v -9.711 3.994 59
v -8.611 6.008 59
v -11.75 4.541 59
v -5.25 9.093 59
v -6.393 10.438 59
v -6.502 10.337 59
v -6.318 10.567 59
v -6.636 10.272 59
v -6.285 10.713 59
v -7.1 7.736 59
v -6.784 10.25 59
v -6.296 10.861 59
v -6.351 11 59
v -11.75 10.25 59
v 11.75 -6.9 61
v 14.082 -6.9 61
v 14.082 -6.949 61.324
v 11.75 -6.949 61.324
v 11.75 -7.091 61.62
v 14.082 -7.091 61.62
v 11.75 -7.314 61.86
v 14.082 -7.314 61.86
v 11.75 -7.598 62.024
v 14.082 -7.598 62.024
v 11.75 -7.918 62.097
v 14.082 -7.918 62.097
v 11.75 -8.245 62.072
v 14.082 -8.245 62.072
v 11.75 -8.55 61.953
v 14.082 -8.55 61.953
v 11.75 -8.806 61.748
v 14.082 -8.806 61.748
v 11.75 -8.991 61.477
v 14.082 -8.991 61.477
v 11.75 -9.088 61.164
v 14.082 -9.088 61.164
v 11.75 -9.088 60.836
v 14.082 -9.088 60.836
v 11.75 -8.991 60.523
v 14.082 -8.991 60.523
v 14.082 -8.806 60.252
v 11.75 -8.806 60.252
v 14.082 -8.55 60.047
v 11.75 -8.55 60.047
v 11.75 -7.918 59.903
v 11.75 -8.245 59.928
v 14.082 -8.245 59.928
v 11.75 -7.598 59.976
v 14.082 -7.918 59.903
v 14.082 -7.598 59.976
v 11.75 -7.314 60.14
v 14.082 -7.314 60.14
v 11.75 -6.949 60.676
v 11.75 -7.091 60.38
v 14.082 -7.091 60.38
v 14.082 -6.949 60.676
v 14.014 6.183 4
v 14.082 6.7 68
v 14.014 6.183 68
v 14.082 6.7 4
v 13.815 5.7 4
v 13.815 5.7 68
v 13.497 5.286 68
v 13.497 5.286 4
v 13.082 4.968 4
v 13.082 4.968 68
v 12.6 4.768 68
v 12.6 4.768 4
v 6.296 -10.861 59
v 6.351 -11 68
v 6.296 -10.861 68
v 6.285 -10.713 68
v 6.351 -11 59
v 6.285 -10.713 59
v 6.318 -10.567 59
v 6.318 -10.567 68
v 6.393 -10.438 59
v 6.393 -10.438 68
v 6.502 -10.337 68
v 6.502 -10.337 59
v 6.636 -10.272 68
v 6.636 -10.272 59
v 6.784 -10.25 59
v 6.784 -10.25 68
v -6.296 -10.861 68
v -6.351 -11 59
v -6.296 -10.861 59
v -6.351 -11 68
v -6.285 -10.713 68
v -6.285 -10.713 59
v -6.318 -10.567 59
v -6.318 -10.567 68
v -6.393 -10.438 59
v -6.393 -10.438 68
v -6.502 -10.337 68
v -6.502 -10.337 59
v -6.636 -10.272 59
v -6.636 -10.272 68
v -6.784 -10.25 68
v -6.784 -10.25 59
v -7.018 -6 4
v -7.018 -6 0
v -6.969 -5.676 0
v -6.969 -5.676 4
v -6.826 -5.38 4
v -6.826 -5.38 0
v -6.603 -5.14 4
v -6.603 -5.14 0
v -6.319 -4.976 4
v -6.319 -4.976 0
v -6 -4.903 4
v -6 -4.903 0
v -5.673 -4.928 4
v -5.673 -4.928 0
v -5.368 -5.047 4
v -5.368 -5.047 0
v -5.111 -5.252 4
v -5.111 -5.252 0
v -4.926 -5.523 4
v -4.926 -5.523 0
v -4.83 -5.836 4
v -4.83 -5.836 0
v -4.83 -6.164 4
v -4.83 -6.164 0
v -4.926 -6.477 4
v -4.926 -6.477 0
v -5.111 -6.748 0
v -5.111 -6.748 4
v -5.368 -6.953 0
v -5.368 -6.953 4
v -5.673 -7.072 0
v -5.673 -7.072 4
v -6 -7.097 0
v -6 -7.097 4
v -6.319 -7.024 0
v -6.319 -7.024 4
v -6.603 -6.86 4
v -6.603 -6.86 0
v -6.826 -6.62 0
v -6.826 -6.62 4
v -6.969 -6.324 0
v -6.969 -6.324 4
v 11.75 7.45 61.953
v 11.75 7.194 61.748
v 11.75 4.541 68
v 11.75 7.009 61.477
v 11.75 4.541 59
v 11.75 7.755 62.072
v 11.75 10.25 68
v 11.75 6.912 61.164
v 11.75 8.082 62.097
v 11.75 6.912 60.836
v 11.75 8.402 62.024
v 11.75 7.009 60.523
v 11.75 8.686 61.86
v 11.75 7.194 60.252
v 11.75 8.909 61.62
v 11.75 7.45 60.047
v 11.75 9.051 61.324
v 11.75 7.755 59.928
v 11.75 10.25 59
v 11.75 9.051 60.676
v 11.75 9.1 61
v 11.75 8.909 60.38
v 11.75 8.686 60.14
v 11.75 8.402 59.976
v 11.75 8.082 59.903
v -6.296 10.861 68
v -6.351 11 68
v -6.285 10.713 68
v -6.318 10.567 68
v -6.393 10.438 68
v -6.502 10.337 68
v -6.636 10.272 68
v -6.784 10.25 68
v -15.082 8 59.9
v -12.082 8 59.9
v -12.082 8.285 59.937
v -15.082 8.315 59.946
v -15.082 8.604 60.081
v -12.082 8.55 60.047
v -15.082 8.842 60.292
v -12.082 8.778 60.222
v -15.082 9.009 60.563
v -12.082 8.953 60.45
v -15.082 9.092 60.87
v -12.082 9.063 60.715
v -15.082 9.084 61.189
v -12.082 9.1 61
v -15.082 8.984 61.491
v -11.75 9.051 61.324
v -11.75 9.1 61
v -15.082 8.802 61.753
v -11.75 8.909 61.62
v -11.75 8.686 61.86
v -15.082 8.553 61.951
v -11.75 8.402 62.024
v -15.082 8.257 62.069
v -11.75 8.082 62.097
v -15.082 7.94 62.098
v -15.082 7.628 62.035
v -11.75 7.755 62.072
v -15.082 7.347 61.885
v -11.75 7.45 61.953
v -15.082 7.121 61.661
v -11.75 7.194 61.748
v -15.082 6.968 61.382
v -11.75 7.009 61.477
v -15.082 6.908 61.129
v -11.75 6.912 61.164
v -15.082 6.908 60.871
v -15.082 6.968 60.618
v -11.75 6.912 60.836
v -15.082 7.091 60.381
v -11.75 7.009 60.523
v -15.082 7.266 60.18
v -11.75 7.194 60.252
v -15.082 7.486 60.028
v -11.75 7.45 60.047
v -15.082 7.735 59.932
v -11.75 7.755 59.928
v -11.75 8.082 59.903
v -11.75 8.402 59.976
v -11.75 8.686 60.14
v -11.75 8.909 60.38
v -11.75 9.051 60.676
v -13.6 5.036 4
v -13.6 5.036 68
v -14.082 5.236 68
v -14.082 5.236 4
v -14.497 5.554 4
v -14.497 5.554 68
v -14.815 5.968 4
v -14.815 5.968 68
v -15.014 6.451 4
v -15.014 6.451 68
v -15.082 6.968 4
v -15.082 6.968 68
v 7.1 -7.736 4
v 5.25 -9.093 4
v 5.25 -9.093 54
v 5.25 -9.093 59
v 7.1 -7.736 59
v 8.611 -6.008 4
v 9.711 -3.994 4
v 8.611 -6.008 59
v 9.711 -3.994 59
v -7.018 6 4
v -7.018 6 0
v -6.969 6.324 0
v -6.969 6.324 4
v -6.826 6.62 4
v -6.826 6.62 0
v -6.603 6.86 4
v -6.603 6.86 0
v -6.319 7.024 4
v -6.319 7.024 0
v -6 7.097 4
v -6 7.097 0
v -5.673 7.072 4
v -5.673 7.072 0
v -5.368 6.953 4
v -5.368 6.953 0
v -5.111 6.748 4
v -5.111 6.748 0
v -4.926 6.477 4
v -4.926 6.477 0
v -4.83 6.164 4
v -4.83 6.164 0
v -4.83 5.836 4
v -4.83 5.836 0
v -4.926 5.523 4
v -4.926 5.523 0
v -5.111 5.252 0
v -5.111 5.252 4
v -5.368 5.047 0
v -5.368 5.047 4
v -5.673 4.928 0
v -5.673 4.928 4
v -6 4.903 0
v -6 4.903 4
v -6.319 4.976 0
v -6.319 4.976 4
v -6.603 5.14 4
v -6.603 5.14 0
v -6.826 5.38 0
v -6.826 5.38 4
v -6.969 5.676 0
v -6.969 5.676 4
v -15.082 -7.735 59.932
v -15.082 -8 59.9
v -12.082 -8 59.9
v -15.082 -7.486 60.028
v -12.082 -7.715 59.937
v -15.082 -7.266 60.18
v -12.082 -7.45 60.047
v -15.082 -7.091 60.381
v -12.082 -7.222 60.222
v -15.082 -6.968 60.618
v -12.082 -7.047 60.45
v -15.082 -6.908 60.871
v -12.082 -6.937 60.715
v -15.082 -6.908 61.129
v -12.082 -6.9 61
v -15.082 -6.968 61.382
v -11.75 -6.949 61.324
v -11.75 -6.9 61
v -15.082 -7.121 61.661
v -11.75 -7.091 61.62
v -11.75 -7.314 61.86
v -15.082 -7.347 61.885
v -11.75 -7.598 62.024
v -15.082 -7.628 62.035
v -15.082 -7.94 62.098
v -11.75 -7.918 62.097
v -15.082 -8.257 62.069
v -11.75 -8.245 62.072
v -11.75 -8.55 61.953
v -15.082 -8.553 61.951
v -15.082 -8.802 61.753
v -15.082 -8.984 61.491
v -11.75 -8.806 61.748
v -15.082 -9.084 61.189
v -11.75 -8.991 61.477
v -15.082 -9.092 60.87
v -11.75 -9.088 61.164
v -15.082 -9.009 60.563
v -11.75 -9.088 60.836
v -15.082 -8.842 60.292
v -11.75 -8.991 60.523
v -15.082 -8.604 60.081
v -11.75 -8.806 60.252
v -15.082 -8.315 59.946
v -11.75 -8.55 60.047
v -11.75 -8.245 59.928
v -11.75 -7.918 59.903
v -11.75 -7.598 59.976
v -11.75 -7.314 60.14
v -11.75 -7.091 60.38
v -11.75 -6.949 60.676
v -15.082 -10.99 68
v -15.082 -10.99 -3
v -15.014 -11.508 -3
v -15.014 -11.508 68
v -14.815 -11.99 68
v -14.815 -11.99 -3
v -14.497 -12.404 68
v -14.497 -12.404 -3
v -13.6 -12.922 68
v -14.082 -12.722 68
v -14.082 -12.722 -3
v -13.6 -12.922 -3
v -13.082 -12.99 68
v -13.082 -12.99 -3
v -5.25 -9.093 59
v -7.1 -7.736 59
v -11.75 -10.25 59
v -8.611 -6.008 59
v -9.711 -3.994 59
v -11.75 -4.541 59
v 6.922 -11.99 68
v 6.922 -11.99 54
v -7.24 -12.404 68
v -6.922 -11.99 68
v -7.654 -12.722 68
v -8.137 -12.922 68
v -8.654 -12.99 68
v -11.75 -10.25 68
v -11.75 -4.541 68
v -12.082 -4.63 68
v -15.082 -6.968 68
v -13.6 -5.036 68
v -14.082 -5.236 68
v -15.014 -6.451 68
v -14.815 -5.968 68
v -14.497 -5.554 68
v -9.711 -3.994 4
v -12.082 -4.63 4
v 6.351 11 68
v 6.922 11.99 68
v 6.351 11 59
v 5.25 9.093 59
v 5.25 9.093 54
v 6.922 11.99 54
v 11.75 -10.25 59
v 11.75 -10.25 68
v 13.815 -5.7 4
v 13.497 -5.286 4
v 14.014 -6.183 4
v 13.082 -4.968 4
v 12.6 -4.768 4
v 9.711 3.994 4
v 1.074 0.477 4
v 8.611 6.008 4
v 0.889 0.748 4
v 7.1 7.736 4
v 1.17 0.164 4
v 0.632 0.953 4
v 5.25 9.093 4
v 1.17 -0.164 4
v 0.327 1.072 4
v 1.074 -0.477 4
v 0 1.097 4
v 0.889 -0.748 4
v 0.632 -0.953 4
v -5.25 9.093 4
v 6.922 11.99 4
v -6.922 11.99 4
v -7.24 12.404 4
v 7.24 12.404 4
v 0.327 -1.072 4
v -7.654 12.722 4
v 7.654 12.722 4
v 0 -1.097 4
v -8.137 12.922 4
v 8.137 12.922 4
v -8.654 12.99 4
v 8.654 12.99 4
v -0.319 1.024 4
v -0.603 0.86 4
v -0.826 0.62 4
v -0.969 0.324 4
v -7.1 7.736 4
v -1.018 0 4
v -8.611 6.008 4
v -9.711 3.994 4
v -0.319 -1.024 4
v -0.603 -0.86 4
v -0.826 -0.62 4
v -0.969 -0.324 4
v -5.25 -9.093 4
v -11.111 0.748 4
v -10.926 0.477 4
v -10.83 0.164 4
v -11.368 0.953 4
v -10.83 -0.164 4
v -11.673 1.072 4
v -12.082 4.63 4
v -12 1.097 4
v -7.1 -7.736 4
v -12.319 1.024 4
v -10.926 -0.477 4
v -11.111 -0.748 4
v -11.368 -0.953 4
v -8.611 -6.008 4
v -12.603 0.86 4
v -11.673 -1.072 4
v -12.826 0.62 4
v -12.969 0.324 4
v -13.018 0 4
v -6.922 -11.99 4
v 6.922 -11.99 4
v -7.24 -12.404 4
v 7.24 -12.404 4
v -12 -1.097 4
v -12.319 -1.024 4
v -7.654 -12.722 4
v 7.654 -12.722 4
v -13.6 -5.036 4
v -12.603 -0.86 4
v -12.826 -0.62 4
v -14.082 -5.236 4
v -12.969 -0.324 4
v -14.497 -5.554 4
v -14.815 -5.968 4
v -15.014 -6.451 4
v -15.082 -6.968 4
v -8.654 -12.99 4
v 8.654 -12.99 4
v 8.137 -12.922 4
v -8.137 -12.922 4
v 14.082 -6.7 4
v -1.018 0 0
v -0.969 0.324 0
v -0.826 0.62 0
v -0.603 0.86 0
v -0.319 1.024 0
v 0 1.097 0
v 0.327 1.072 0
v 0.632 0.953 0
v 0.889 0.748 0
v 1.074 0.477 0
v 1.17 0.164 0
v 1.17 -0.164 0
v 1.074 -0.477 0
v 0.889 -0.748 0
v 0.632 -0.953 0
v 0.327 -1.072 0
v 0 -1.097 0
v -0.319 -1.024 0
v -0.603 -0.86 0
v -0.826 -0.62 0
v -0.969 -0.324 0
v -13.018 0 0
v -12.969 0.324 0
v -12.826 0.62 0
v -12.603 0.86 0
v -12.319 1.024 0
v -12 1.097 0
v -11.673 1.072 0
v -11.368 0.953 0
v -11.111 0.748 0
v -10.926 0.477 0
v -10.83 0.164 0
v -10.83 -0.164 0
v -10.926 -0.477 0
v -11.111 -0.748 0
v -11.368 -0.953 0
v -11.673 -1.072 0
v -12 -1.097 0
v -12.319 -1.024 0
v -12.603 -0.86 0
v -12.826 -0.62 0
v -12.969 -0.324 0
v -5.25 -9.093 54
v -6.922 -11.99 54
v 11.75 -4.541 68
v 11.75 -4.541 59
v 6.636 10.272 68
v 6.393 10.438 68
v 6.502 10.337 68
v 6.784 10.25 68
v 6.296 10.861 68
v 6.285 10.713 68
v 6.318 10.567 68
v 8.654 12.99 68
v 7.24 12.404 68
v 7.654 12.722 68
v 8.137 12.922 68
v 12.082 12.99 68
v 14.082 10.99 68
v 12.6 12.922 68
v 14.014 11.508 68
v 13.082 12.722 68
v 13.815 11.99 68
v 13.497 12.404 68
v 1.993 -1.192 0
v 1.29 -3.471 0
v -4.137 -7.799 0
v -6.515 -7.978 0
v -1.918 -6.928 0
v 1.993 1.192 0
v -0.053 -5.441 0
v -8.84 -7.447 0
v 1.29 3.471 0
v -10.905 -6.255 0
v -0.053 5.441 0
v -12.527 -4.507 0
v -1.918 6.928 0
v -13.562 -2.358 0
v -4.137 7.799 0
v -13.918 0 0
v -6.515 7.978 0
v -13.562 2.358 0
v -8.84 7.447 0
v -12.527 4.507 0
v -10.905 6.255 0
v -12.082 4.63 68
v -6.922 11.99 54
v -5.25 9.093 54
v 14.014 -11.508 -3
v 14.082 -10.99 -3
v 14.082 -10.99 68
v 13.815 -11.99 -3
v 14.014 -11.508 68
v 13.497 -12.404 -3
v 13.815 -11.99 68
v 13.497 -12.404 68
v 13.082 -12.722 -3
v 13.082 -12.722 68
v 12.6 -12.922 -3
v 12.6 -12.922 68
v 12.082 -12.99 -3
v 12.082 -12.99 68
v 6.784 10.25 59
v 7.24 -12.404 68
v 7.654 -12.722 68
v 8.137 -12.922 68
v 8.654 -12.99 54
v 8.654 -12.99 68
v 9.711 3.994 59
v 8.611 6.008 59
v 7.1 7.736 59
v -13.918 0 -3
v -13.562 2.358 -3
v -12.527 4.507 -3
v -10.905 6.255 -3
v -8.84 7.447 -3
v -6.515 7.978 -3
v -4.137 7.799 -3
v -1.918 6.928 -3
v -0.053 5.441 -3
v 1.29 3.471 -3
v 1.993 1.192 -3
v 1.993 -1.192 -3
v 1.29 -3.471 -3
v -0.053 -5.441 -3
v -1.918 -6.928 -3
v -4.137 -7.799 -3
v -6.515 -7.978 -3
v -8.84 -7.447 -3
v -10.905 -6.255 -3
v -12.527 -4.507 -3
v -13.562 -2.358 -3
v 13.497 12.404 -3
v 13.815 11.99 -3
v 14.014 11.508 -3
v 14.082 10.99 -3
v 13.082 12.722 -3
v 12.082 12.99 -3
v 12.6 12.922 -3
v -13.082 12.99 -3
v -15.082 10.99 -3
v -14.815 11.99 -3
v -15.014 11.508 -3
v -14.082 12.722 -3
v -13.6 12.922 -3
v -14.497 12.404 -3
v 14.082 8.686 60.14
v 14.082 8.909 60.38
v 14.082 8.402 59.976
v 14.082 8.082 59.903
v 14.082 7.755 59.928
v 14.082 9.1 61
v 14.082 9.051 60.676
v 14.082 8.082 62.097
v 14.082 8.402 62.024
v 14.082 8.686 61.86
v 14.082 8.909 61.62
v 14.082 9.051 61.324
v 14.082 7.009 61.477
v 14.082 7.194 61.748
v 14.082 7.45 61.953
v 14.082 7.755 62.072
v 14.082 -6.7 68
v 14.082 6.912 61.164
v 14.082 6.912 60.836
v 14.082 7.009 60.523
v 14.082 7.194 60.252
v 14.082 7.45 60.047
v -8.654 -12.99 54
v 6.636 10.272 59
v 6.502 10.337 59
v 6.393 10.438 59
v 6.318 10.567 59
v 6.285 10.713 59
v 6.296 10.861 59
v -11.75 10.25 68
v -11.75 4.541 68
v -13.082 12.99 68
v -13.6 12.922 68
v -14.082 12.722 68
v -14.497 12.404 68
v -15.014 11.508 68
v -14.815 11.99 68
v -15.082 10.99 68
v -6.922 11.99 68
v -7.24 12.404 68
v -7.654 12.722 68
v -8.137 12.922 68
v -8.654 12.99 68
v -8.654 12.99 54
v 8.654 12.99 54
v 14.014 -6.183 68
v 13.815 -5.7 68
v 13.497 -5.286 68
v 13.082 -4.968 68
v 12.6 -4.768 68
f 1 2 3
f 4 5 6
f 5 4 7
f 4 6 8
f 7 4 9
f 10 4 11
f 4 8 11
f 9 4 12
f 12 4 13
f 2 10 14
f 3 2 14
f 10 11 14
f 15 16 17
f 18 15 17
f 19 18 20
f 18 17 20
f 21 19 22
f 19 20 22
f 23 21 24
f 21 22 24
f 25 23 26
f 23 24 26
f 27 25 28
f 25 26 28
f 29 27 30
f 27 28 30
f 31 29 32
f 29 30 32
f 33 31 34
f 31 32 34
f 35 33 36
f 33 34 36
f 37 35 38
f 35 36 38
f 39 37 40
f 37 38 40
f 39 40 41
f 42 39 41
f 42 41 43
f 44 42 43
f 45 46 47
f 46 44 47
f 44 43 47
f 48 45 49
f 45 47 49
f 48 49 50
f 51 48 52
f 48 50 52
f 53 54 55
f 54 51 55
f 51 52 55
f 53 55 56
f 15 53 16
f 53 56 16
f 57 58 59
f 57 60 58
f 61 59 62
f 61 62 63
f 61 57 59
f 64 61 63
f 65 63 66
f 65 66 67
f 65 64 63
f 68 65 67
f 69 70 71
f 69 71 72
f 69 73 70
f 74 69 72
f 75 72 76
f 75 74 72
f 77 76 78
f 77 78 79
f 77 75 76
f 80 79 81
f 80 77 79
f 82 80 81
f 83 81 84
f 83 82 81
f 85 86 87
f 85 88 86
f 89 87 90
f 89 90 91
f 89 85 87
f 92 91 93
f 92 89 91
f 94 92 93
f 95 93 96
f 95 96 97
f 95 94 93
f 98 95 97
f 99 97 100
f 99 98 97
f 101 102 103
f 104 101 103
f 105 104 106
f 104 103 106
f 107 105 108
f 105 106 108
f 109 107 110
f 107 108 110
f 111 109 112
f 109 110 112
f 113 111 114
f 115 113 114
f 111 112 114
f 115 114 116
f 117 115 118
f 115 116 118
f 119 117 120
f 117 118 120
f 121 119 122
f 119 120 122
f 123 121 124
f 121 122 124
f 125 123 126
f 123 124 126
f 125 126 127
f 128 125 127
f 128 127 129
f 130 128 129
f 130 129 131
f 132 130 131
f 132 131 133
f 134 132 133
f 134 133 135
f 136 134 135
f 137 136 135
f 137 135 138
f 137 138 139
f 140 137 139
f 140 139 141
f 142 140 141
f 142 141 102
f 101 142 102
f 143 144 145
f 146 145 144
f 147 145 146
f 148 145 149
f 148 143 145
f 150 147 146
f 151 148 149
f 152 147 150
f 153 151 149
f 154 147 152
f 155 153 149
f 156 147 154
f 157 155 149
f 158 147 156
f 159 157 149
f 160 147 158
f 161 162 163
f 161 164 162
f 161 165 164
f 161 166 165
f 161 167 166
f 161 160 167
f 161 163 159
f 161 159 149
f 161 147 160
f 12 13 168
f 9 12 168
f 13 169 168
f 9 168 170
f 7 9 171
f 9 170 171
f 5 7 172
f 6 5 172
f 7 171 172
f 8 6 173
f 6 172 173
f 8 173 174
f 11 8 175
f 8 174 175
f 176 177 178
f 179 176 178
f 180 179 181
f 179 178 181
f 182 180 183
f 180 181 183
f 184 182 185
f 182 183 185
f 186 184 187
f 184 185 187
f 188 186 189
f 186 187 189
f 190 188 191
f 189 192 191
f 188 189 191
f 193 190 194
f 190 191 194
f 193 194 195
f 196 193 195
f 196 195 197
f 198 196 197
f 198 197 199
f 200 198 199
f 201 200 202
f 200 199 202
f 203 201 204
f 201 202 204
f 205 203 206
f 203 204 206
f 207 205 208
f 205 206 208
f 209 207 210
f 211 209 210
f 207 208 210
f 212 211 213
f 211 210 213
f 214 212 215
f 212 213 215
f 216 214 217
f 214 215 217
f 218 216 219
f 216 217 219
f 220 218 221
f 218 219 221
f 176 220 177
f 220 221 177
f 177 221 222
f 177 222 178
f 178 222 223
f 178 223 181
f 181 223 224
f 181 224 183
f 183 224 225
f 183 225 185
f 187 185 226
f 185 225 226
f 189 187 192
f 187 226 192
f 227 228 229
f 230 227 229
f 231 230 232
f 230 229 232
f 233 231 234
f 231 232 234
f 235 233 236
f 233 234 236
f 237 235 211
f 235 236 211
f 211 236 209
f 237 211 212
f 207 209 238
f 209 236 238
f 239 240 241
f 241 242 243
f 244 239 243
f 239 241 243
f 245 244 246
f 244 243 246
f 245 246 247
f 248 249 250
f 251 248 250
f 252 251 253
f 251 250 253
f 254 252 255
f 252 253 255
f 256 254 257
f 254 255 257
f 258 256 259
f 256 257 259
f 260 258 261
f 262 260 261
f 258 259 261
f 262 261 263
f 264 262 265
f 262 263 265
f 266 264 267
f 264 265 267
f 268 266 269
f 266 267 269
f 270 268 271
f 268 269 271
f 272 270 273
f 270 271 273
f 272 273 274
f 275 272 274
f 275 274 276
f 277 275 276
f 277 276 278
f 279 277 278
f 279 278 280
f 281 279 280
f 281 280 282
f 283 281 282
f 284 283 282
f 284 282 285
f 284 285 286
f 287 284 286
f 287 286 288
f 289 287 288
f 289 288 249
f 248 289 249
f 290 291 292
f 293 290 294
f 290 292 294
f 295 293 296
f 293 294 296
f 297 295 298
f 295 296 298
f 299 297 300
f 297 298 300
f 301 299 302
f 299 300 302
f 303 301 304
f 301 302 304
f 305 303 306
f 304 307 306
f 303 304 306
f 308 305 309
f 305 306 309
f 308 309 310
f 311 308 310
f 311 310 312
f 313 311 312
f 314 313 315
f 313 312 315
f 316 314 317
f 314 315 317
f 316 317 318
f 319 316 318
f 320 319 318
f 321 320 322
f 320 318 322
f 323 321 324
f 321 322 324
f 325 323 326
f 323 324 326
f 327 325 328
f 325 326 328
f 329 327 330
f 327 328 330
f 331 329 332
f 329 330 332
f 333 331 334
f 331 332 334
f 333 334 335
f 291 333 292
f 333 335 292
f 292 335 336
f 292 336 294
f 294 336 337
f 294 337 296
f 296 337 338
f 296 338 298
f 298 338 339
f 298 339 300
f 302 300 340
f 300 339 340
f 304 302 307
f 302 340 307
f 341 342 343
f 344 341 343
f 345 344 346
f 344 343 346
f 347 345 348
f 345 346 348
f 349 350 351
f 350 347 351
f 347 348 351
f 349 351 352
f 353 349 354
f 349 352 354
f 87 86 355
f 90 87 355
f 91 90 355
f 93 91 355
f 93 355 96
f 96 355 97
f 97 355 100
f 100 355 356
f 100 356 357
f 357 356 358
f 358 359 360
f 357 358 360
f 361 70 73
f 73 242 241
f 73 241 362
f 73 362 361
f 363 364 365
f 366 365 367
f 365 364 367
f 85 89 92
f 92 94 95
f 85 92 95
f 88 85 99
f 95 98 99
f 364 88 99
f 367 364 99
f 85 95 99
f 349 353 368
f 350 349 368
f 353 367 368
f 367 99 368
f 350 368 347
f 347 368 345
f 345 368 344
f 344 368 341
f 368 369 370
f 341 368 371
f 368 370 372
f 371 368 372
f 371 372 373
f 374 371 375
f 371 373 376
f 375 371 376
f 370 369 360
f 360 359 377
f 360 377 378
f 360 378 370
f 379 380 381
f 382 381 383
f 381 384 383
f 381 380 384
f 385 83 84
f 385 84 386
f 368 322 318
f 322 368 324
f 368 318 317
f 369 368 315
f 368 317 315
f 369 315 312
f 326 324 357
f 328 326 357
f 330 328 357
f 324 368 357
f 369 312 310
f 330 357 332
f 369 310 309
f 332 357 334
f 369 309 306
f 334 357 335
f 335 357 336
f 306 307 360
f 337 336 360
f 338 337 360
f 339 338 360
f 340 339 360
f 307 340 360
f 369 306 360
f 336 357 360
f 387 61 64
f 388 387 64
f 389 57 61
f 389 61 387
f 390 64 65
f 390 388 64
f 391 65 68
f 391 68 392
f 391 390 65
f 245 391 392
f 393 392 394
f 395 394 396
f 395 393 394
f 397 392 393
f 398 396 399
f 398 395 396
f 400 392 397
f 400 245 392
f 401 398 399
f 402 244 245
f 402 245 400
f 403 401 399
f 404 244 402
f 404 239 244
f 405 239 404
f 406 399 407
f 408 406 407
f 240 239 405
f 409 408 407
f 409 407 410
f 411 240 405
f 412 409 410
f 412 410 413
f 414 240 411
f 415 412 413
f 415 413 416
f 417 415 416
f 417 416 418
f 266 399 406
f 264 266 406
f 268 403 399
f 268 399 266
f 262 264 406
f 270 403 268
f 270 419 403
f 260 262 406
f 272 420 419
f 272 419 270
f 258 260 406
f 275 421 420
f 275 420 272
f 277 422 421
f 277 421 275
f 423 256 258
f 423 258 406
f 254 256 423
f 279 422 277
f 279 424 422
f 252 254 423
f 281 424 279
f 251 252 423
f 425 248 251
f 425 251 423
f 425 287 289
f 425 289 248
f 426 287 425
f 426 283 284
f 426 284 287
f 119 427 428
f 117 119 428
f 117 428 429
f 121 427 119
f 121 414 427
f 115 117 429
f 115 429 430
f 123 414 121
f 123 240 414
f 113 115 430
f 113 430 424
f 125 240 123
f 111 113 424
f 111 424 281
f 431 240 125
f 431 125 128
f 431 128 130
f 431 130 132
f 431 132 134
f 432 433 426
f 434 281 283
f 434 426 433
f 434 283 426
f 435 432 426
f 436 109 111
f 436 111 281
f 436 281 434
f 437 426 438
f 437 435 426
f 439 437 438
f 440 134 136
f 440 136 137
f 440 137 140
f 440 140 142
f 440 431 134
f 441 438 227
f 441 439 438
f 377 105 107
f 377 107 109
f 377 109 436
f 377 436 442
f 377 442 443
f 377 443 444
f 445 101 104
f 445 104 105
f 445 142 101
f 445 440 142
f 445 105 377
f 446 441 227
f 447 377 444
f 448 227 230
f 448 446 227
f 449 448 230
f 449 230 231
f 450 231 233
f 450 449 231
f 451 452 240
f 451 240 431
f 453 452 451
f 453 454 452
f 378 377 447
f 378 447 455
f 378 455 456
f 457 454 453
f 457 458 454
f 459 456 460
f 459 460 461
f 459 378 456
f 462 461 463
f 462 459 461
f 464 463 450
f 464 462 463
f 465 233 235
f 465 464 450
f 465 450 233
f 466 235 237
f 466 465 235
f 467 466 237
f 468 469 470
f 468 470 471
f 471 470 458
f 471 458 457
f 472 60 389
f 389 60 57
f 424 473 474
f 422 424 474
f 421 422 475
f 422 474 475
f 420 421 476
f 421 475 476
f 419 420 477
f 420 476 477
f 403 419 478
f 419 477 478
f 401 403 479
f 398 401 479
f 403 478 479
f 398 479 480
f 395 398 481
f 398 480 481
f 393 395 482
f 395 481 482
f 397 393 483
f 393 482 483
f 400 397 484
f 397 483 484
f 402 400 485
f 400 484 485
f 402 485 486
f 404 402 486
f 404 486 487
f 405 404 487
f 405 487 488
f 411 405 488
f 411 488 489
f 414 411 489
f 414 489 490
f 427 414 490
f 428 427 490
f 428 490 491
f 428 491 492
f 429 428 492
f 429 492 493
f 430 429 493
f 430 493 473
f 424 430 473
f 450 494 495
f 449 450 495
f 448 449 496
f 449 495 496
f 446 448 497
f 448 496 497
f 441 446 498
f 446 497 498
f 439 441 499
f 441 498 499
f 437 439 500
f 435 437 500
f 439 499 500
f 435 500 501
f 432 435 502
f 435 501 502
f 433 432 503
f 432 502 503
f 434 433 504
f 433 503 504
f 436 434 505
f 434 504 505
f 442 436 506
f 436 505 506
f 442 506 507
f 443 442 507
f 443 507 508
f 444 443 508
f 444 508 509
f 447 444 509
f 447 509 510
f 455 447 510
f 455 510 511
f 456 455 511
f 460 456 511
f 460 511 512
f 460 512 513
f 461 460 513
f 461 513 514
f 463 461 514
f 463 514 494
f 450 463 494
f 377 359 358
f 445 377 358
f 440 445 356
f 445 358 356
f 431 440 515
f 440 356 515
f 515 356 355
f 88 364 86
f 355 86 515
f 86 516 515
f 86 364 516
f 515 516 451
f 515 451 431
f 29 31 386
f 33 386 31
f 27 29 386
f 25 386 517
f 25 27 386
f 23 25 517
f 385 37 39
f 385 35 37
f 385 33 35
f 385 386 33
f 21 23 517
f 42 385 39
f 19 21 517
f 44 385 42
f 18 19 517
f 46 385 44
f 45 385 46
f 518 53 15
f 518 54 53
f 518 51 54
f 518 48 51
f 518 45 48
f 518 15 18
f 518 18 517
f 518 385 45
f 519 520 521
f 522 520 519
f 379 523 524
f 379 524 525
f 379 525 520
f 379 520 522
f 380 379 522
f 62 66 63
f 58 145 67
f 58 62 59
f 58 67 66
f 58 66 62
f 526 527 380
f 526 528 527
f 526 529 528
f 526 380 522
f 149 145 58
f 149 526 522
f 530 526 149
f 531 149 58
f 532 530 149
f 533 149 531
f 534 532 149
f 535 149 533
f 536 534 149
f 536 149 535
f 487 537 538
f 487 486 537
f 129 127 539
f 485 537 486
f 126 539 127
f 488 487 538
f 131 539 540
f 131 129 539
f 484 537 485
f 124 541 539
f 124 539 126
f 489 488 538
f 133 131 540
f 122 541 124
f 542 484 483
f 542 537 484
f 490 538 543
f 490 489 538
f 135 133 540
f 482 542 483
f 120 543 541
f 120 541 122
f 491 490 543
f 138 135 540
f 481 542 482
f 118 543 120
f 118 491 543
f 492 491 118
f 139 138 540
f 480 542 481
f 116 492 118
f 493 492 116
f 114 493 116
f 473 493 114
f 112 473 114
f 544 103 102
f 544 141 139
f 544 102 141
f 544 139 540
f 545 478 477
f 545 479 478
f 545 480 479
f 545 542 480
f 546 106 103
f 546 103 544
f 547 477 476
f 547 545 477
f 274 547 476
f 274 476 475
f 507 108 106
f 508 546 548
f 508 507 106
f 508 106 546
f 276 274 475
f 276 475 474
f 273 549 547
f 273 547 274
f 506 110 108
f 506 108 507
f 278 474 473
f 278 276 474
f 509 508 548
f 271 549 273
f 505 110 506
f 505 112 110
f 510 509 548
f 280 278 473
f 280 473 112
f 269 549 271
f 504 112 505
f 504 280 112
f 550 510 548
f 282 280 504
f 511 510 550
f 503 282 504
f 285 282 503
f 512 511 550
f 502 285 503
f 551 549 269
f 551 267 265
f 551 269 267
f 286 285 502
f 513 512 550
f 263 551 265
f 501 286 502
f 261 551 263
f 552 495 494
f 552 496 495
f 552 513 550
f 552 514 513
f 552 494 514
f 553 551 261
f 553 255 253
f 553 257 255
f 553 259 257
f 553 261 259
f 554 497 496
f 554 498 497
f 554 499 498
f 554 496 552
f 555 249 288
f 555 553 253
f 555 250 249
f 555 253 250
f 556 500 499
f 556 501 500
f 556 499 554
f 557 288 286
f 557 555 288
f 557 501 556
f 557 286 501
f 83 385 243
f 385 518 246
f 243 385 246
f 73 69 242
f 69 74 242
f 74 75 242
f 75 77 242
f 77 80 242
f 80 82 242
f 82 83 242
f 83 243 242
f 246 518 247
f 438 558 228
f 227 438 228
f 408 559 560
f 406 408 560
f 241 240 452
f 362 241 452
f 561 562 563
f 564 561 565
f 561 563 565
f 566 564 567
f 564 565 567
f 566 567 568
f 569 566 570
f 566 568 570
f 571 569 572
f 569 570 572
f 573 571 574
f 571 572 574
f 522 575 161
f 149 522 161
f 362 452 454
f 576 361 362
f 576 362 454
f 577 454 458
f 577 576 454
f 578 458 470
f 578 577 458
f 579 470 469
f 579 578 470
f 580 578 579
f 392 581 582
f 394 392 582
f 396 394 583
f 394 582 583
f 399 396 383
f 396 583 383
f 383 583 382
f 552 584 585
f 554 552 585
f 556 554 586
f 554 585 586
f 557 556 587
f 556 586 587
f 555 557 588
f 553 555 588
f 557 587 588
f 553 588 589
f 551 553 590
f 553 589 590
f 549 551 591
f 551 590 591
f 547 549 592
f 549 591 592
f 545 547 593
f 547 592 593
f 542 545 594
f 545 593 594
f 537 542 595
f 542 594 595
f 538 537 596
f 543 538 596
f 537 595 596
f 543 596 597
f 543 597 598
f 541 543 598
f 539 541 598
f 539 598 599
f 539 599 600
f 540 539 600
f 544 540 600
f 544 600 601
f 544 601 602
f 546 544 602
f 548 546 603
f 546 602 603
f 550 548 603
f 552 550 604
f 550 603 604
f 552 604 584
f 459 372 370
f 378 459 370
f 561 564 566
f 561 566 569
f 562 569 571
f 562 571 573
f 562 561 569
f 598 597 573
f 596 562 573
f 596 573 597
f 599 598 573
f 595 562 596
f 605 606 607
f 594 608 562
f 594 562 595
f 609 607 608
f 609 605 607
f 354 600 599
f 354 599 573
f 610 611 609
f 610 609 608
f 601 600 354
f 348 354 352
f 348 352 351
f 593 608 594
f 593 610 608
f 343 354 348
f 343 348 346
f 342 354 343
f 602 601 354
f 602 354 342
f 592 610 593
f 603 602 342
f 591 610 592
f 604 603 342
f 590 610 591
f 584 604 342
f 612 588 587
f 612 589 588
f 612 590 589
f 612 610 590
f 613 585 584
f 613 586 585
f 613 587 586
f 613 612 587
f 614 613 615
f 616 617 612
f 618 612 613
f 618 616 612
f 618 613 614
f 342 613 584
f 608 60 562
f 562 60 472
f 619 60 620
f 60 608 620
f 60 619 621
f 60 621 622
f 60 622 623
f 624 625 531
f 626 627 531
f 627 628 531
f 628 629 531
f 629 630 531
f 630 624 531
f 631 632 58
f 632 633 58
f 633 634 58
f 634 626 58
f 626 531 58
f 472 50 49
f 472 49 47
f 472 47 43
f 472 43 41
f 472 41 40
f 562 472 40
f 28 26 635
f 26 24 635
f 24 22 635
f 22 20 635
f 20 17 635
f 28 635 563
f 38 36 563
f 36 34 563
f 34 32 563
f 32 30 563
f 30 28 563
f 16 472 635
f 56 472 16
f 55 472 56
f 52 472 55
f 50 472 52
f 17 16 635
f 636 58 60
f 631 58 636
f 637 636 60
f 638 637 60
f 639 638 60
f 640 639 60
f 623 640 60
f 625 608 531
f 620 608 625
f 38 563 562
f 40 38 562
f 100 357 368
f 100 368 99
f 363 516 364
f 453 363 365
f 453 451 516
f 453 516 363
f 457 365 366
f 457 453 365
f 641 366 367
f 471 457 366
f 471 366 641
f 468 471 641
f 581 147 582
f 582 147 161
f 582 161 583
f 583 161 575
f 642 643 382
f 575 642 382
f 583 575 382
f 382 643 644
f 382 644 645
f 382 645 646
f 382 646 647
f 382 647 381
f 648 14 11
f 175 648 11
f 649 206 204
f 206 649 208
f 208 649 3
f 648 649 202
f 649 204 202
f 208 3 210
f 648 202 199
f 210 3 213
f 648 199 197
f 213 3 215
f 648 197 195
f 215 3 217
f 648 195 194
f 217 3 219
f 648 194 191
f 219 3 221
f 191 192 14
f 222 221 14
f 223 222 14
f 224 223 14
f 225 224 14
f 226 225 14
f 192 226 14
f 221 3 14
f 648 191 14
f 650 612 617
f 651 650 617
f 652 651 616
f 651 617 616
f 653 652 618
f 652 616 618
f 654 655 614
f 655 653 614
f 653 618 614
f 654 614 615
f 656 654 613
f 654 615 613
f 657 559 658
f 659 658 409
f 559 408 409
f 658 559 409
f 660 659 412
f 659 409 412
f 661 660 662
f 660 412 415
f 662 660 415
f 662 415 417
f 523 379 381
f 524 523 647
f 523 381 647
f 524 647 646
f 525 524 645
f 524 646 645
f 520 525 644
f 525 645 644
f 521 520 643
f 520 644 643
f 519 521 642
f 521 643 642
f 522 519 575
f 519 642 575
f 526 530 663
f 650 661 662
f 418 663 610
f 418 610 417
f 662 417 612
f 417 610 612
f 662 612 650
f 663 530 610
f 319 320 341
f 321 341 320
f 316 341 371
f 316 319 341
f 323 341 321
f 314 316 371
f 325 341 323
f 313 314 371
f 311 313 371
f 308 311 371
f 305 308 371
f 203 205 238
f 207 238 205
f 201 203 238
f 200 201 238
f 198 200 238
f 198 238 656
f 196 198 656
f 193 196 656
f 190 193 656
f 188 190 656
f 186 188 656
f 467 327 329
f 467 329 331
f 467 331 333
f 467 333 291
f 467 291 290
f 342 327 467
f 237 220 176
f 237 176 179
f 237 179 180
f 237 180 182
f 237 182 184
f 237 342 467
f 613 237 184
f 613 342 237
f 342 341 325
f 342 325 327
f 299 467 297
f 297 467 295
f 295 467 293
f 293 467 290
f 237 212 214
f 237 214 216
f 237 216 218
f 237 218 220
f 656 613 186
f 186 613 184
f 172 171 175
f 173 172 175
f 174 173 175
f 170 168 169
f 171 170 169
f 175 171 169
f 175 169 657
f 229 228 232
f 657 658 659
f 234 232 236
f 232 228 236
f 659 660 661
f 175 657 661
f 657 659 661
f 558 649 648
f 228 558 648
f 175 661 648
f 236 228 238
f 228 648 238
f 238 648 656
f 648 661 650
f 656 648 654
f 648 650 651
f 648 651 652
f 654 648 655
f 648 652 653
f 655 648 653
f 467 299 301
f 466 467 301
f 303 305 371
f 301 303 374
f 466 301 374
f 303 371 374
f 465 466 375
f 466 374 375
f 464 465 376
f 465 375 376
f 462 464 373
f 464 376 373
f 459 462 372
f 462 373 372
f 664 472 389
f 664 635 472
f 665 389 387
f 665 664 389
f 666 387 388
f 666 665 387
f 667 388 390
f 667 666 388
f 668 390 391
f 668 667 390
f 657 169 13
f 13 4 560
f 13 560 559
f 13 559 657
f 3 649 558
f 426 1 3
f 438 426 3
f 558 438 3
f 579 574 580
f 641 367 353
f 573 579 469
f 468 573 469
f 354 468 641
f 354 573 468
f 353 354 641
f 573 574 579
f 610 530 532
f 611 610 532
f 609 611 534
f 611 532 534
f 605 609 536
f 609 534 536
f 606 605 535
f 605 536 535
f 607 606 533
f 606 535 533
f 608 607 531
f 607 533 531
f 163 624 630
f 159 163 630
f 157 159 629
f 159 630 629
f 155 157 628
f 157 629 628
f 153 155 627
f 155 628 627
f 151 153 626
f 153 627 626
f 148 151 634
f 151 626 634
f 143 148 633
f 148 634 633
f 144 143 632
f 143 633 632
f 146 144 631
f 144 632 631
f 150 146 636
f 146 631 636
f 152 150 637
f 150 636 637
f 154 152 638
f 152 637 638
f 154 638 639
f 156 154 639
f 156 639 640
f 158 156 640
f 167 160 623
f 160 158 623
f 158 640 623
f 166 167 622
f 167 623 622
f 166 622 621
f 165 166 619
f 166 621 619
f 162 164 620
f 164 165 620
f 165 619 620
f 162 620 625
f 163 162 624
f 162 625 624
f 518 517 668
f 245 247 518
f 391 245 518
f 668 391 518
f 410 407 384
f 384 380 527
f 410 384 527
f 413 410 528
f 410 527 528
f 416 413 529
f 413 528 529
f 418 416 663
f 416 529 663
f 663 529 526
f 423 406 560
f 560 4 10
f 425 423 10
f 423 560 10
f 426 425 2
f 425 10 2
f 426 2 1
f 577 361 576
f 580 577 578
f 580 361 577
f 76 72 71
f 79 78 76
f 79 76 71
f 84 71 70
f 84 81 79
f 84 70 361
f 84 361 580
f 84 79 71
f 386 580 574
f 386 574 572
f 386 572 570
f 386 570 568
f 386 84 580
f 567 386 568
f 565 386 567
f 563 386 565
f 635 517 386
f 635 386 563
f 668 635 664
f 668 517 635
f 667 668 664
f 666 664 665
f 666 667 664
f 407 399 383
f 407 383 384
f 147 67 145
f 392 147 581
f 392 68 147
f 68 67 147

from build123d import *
from build123d.topology import SkipClean

# Parameters (mm, degrees)
SKETCH_1_R               = 15
EXTRUDE_1_DEPTH          = 59
SKETCH_2_R               = 1.1
CUT_EXTRUDE_1_DEPTH      = 10
SKETCH_3_W               = 28.98
SKETCH_3_H               = 25.98
SKETCH_3_W_2             = 23.5
SKETCH_3_H_2             = 20.5
EXTRUDE_2_DEPTH          = 9
CUT_EXTRUDE_2_DEPTH      = 55
SKETCH_6_W               = 28.98
SKETCH_6_H               = 25.98
EXTRUDE_6_DEPTH          = 5
CUT_EXTRUDE_3_REACH      = 77.622
SKETCH_7_R               = 1.1
SKETCH_10_R              = 0.8
CUT_EXTRUDE_4_DEPTH      = 68.424031324
CUT_EXTRUDE_5_DEPTH      = 59.017238817
FILLET_1_R               = 0.5
EXTRUDE_7_DEPTH          = 50
SKETCH_17_W              = 0.407540604
SKETCH_17_H              = 25.98
CUT_EXTRUDE_7_DEPTH      = 59.017238817
FILLET_3_R               = 2
CUT_EXTRUDE_6_DEPTH      = 59.017238817
PATTERN_CIRCULAR_4_COUNT = 4
BOSS_EXTRUDE1_START      = 54
BOSS_EXTRUDE1_DEPTH      = 54
CUT_EXTRUDE1_DEPTH       = 72.232015274
SKETCH4_R                = 10
SKETCH4_R_2              = 0.8
BOSS_EXTRUDE2_DEPTH      = 3
FILLET1_R                = 2
SKETCH5_R                = 0.8
BOSS_EXTRUDE3_DEPTH      = 7
BOSS_EXTRUDE4_START      = -7
SKETCH7_R                = 10
BOSS_EXTRUDE4_DEPTH      = 7
SKETCH11_W               = 3
SKETCH11_H               = 25.98
BOSS_EXTRUDE7_DEPTH      = 71
SKETCH6_R                = 1.1
CUT_EXTRUDE2_DEPTH       = 74.737512037
SKETCH8_R                = 10.5
CUT_EXTRUDE5_DEPTH       = 55
SKETCH9_R                = 8
CUT_EXTRUDE6_DEPTH       = 3
CUT_EXTRUDE7_DEPTH       = 64
SKETCH14_R               = 1.1
CUT_EXTRUDE8_DEPTH       = 29.164918793
FILLET2_R                = 2


with BuildPart() as part:
    # 草图1 → 凸台-拉伸1 (new body)
    with BuildSketch(Plane.XY):
        Circle(SKETCH_1_R)
    extrude(amount=EXTRUDE_1_DEPTH)

    # 草图2 → 切除-拉伸1 (cut)
    with BuildSketch(Plane(origin=(0, 0, 0), x_dir=(-1, 0, 0), z_dir=(0, 0, -1))):
        with Locations((0, 6)):
            Circle(SKETCH_2_R)
        with Locations(Location((0, -6, 0), (0, 0, 180))):
            Circle(SKETCH_2_R)
        with Locations((6, 0)):
            Circle(SKETCH_2_R)
        with Locations(Location((-6, 0, 0), (0, 0, 180))):
            Circle(SKETCH_2_R)
    extrude(amount=-CUT_EXTRUDE_1_DEPTH, mode=Mode.SUBTRACT)

    # 草图3 → 凸台-拉伸2 (add)
    with BuildSketch(Plane.XY.offset(59)):
        Rectangle(SKETCH_3_W, SKETCH_3_H)
        Rectangle(SKETCH_3_W_2, SKETCH_3_H_2, mode=Mode.SUBTRACT)
    extrude(amount=EXTRUDE_2_DEPTH)

    # 草图4 → 切除-拉伸2 (cut)
    with BuildSketch(Plane(origin=(0, 0, 4), x_dir=(-1, 0, 0), z_dir=(0, 0, -1))):
        with BuildLine():
            Line((-2.598076211, 4.5), (-7.5, 12.990381057))
            ThreePointArc((-7.5, 12.990381057), (0, 15), (7.5, 12.990381057))
            Line((7.5, 12.990381057), (2.598076211, 4.5))
            ThreePointArc((2.598076211, 4.5), (0, 3), (-2.598076211, 4.5))
        make_face()
        with BuildLine():
            Line((4.5, -2.598076211), (12.990381057, -7.5))
            ThreePointArc((12.990381057, -7.5), (15, 0), (12.990381057, 7.5))
            Line((12.990381057, 7.5), (4.5, 2.598076211))
            ThreePointArc((4.5, 2.598076211), (3, 0), (4.5, -2.598076211))
        make_face()
        with BuildLine():
            Line((-2.598076211, -4.5), (-7.5, -12.990381057))
            ThreePointArc((-7.5, -12.990381057), (0, -15), (7.5, -12.990381057))
            Line((7.5, -12.990381057), (2.598076211, -4.5))
            ThreePointArc((2.598076211, -4.5), (0, -3), (-2.598076211, -4.5))
        make_face()
        with BuildLine():
            Line((-4.5, 2.598076211), (-12.990381057, 7.5))
            ThreePointArc((-12.990381057, 7.5), (-15, 0), (-12.990381057, -7.5))
            Line((-12.990381057, -7.5), (-4.5, -2.598076211))
            ThreePointArc((-4.5, -2.598076211), (-3, 0), (-4.5, 2.598076211))
        make_face()
    extrude(amount=-CUT_EXTRUDE_2_DEPTH, mode=Mode.SUBTRACT)

    # 草图6 → 凸台-拉伸6 (add)
    with BuildSketch(Plane(origin=(0, 0, 59), x_dir=(-1, 0, 0), z_dir=(0, 0, -1))):
        Rectangle(SKETCH_6_W, SKETCH_6_H)
    extrude(amount=EXTRUDE_6_DEPTH)

    # 切除-拉伸3: up to this face of the body (flat: up to its plane)
    cut_extrude_3_end = Plane(part.part.faces().sort_by_distance((-14.49, 0, 61))[0])
    # 草图7 → 切除-拉伸3 (cut, up to the picked face)
    with BuildSketch(Plane(origin=(14.49, 0, 0), x_dir=(0, 0, -1), z_dir=(1, 0, 0)), mode=Mode.PRIVATE) as cut_extrude_3_sk1:
        with Locations(Location((-61, -8, 0), (0, 0, 90))):
            Circle(SKETCH_7_R)
    cut_extrude_3_tool1 = split(extrude(cut_extrude_3_sk1.sketch, amount=-CUT_EXTRUDE_3_REACH, mode=Mode.PRIVATE), bisect_by=cut_extrude_3_end, keep=Keep.BOTH, mode=Mode.PRIVATE)
    # 草图7 → 切除-拉伸3 (cut, up to the picked face)
    with BuildSketch(Plane(origin=(14.49, 0, 0), x_dir=(0, 0, -1), z_dir=(1, 0, 0)), mode=Mode.PRIVATE) as cut_extrude_3_sk2:
        with Locations(Location((-61, 8, 0), (0, 0, 90))):
            Circle(SKETCH_7_R)
    cut_extrude_3_tool2 = split(extrude(cut_extrude_3_sk2.sketch, amount=-CUT_EXTRUDE_3_REACH, mode=Mode.PRIVATE), bisect_by=cut_extrude_3_end, keep=Keep.BOTH, mode=Mode.PRIVATE)
    add(cut_extrude_3_tool1.solids().sort_by(Axis((14.49, -8, 61), (-1, 0, 0)))[0], mode=Mode.SUBTRACT)
    add(cut_extrude_3_tool2.solids().sort_by(Axis((14.49, 8, 61), (-1, 0, 0)))[0], mode=Mode.SUBTRACT)

    # 草图10 → 切除-拉伸4 (cut, through all)
    with BuildSketch(Plane.XY.offset(4)):
        with Locations((0, -12)):
            Circle(SKETCH_10_R)
    cut_extrude_4 = extrude(amount=-CUT_EXTRUDE_4_DEPTH, mode=Mode.SUBTRACT)

    # 草图11 → 切除-拉伸5 (cut, through all)
    with BuildSketch(Plane(origin=(0, 0, 54), x_dir=(-1, 0, 0), z_dir=(0, 0, -1))):
        with BuildLine():
            Line((2.598076211, 4.5), (7.499779997, 12.99))
            Line((7.499779997, 12.99), (-7.499779997, 12.99))
            Line((-7.499779997, 12.99), (-2.598076211, 4.5))
            ThreePointArc((-2.598076211, 4.5), (0, 3), (2.598076211, 4.5))
        make_face()
        with BuildLine():
            Line((-2.598076211, -4.5), (-7.499779997, -12.99))
            Line((-7.499779997, -12.99), (7.499779997, -12.99))
            Line((7.499779997, -12.99), (2.598076211, -4.5))
            ThreePointArc((2.598076211, -4.5), (0, -3), (-2.598076211, -4.5))
        make_face()
    extrude(amount=-CUT_EXTRUDE_5_DEPTH, mode=Mode.SUBTRACT)

    # 圆角1
    fillet_1_edges = [part.edges().sort_by_distance(p)[0] for p in [
        (5.917840259, 10.25, 63.5),
        (-5.917840259, 10.25, 63.5),
        (-5.917840259, -10.25, 63.5),
        (5.917840259, -10.25, 63.5),
    ]]
    fillet(fillet_1_edges, radius=FILLET_1_R)

    # 草图12 → 凸台-拉伸7 (add)
    with SkipClean():  # the faces are left unmerged after this step: merging them gives an invalid solid
        with BuildSketch(Plane.XY.offset(4)):
            with BuildLine():
                Line((-4.5, 2.598076211), (-14.082459396, 5.165688468))
                ThreePointArc((-14.082459396, 5.165688468), (-13.586645102, 6.356341311), (-12.990381057, 7.5))
                Line((-12.990381057, 7.5), (-4.5, 2.598076211))
            make_face()
            with BuildLine():
                Line((-12.990381057, -7.5), (-4.5, -2.598076211))
                Line((-4.5, -2.598076211), (-14.082459396, -5.165688468))
                ThreePointArc((-14.082459396, -5.165688468), (-13.586645102, -6.356341311), (-12.990381057, -7.5))
            make_face()
            with BuildLine():
                Line((4.5, -2.598076211), (14.082459396, -5.165688468))
                ThreePointArc((14.082459396, -5.165688468), (13.586645102, -6.356341311), (12.990381057, -7.5))
                Line((12.990381057, -7.5), (4.5, -2.598076211))
            make_face()
            with BuildLine():
                Line((4.5, 2.598076211), (12.990381057, 7.5))
                ThreePointArc((12.990381057, 7.5), (13.586645102, 6.356341311), (14.082459396, 5.165688468))
                Line((14.082459396, 5.165688468), (4.5, 2.598076211))
            make_face()
        extrude(amount=EXTRUDE_7_DEPTH)

    # 草图17 → 切除-拉伸7 (cut, through all)
    with SkipClean():  # the faces are left unmerged after this step: merging them gives an invalid solid
        with BuildSketch(Plane(origin=(0, 0, 54), x_dir=(-1, 0, 0), z_dir=(0, 0, -1))):
            with Locations((14.286229698, 0)):
                Rectangle(SKETCH_17_W, SKETCH_17_H)
            with Locations((-14.286229698, 0)):
                Rectangle(SKETCH_17_W, SKETCH_17_H)
        extrude(amount=-CUT_EXTRUDE_7_DEPTH, mode=Mode.SUBTRACT)

    # 圆角3
    fillet_3_edges = [part.edges().sort_by_distance(p)[0] for p in [
        (-14.082459396, -12.99, 61),
        (-14.082459396, 12.99, 61),
        (14.082459396, 12.99, 61),
        (14.082459396, -12.99, 61),
    ]]
    fillet(fillet_3_edges, radius=FILLET_3_R)

    # 草图13 → 切除-拉伸6 (cut, through all)
    with SkipClean():  # the faces are left unmerged after this step: merging them gives an invalid solid
        with BuildSketch(Plane(origin=(0, 0, 54), x_dir=(-1, 0, 0), z_dir=(0, 0, -1))):
            with BuildLine():
                Line((-4.5, -2.598076211), (-14.082459396, -5.165688468))
                Line((-14.082459396, -5.165688468), (-14.082459396, 5.165688468))
                Line((-14.082459396, 5.165688468), (-4.5, 2.598076211))
                ThreePointArc((-4.5, 2.598076211), (-3, 0), (-4.5, -2.598076211))
            make_face()
            with BuildLine():
                Line((14.082459396, 5.165688468), (14.082459396, -5.165688468))
                Line((14.082459396, -5.165688468), (4.5, -2.598076211))
                ThreePointArc((4.5, -2.598076211), (3, 0), (4.5, 2.598076211))
                Line((4.5, 2.598076211), (14.082459396, 5.165688468))
            make_face()
        extrude(amount=-CUT_EXTRUDE_6_DEPTH, mode=Mode.SUBTRACT)

    # 阵列(圆周)4: 切除-拉伸4 ×4 about axis
    with SkipClean():  # the faces are left unmerged after this step: merging them gives an invalid solid
        pattern_circular_4_axis = Axis((0, 0, 0), (0, 0, 1))
        for i in range(1, PATTERN_CIRCULAR_4_COUNT):
            add(cut_extrude_4.rotate(pattern_circular_4_axis, i * 360 / PATTERN_CIRCULAR_4_COUNT), mode=Mode.SUBTRACT)

    # Sketch1 → Boss-Extrude1 (add)
    with BuildSketch(Plane(origin=(0, 0, 54), x_dir=(-1, 0, 0), z_dir=(0, 0, -1)).offset(BOSS_EXTRUDE1_START)):
        with BuildLine():
            Line((7.500659971, -12.99), (12.082459396, -12.99))
            ThreePointArc((12.082459396, -12.99), (13.496672959, -12.404213562), (14.082459396, -10.99))
            Line((14.082459396, -10.99), (14.082459396, -5.165688468))
            ThreePointArc((14.082459396, -5.165688468), (11.478794499, -9.655945156), (7.500659971, -12.99))
        make_face()
        with BuildLine():
            Line((-14.082459396, -5.165688468), (-14.082459396, -10.99))
            ThreePointArc((-14.082459396, -10.99), (-13.496672959, -12.404213562), (-12.082459396, -12.99))
            Line((-12.082459396, -12.99), (-7.500659971, -12.99))
            ThreePointArc((-7.500659971, -12.99), (-11.478794499, -9.655945156), (-14.082459396, -5.165688468))
        make_face()
        with BuildLine():
            Line((-7.500659971, 12.99), (-12.082459396, 12.99))
            ThreePointArc((-12.082459396, 12.99), (-13.496672959, 12.404213562), (-14.082459396, 10.99))
            Line((-14.082459396, 10.99), (-14.082459396, 5.165688468))
            ThreePointArc((-14.082459396, 5.165688468), (-11.478794499, 9.655945156), (-7.500659971, 12.99))
        make_face()
        with BuildLine():
            Line((14.082459396, 5.165688468), (14.082459396, 10.99))
            ThreePointArc((14.082459396, 10.99), (13.496672959, 12.404213562), (12.082459396, 12.99))
            Line((12.082459396, 12.99), (7.500659971, 12.99))
            ThreePointArc((7.500659971, 12.99), (11.478794499, 9.655945156), (14.082459396, 5.165688468))
        make_face()
    extrude(amount=-BOSS_EXTRUDE1_DEPTH)

    # Sketch3 → Cut-Extrude1 (cut, through all)
    with BuildSketch(Plane(origin=(0, 0, 0), x_dir=(-1, 0, 0), z_dir=(0, 0, -1))):
        with BuildLine():
            Line((-7.500659971, 12.99), (7.500659971, 12.99))
            ThreePointArc((7.500659971, 12.99), (0, 15), (-7.500659971, 12.99))
        make_face()
        with BuildLine():
            Line((14.082459396, 5.165688468), (14.082459396, -5.165688468))
            ThreePointArc((14.082459396, -5.165688468), (15, 0), (14.082459396, 5.165688468))
        make_face()
        with BuildLine():
            Line((7.500659971, -12.99), (-7.500659971, -12.99))
            ThreePointArc((-7.500659971, -12.99), (0, -15), (7.500659971, -12.99))
        make_face()
        with BuildLine():
            Line((-14.082459396, -5.165688468), (-14.082459396, 5.165688468))
            ThreePointArc((-14.082459396, 5.165688468), (-15, 0), (-14.082459396, -5.165688468))
        make_face()
    extrude(amount=-CUT_EXTRUDE1_DEPTH, mode=Mode.SUBTRACT)

    # Sketch4 → Boss-Extrude2 (add)
    with BuildSketch(Plane(origin=(0, 0, 0), x_dir=(-1, 0, 0), z_dir=(0, 0, -1))):
        with BuildLine():
            Line((-14.082459396, 10.99), (-14.082459396, -10.99))
            ThreePointArc((-14.082459396, -10.99), (-13.496672959, -12.404213562), (-12.082459396, -12.99))
            Line((-12.082459396, -12.99), (12.082459396, -12.99))
            ThreePointArc((12.082459396, -12.99), (13.496672959, -12.404213562), (14.082459396, -10.99))
            Line((14.082459396, -10.99), (14.082459396, 10.99))
            ThreePointArc((14.082459396, 10.99), (13.496672959, 12.404213562), (12.082459396, 12.99))
            Line((12.082459396, 12.99), (-12.082459396, 12.99))
            ThreePointArc((-12.082459396, 12.99), (-13.496672959, 12.404213562), (-14.082459396, 10.99))
        make_face()
        Circle(SKETCH4_R, mode=Mode.SUBTRACT)
        with Locations(Location((0, -12, 0), (0, 0, 180))):
            Circle(SKETCH4_R_2, mode=Mode.SUBTRACT)
        with Locations(Location((12, 0, 0), (0, 0, 270))):
            Circle(SKETCH4_R_2, mode=Mode.SUBTRACT)
        with Locations(Location((-12, 0, 0), (0, 0, 90))):
            Circle(SKETCH4_R_2, mode=Mode.SUBTRACT)
        with Locations((0, 12)):
            Circle(SKETCH4_R_2, mode=Mode.SUBTRACT)
    extrude(amount=BOSS_EXTRUDE2_DEPTH)

    # Fillet1
    fillet1_edges = [part.edges().sort_by_distance(p)[0] for p in [
        (7.499779997, 12.99, 36),
        (-7.499779997, 12.99, 36),
        (-7.499779997, -12.99, 36),
        (7.499779997, -12.99, 36),
        (-14.082459396, -5.165688468, 36),
        (-14.082459396, 5.165688468, 36),
        (14.082459396, 5.165688468, 36),
        (14.082459396, -5.165688468, 36),
    ]]
    fillet(fillet1_edges, radius=FILLET1_R)

    # Sketch5 → Boss-Extrude3 (add)
    with BuildSketch(Plane.XY.offset(4)):
        with Locations((0, -12)):
            Circle(SKETCH5_R)
        with Locations((12, 0)):
            Circle(SKETCH5_R)
        with Locations((0, 12)):
            Circle(SKETCH5_R)
        with Locations((-12, 0)):
            Circle(SKETCH5_R)
    extrude(amount=-BOSS_EXTRUDE3_DEPTH)

    # Sketch7 → Boss-Extrude4 (add)
    with BuildSketch(Plane(origin=(0, 0, -3), x_dir=(-1, 0, 0), z_dir=(0, 0, -1)).offset(BOSS_EXTRUDE4_START)):
        Circle(SKETCH7_R)
    extrude(amount=BOSS_EXTRUDE4_DEPTH)

    # Sketch11 → Boss-Extrude7 (add)
    with BuildSketch(Plane(origin=(0, 0, -3), x_dir=(-1, 0, 0), z_dir=(0, 0, -1))):
        with Locations((13.582459396, 0)):
            Rectangle(SKETCH11_W, SKETCH11_H)
    extrude(amount=-BOSS_EXTRUDE7_DEPTH)

    # Sketch6 → Cut-Extrude2 (cut, through all)
    with BuildSketch(Plane(origin=(0, 0, -3), x_dir=(-1, 0, 0), z_dir=(0, 0, -1))):
        with Locations((11.917540604, 0)):
            Circle(SKETCH6_R)
        with Locations((5.917540604, 6)):
            Circle(SKETCH6_R)
        with Locations((5.917540604, -6)):
            Circle(SKETCH6_R)
        with Locations((-0.082459396, 0)):
            Circle(SKETCH6_R)
    extrude(amount=-CUT_EXTRUDE2_DEPTH, mode=Mode.SUBTRACT)

    # Sketch8 → Cut-Extrude5 (cut)
    with BuildSketch(Plane.XY.offset(59)):
        Circle(SKETCH8_R)
    extrude(amount=-CUT_EXTRUDE5_DEPTH, mode=Mode.SUBTRACT)

    # Sketch9 → Cut-Extrude6 (cut)
    with BuildSketch(Plane(origin=(0, 0, -3), x_dir=(-1, 0, 0), z_dir=(0, 0, -1))):
        with Locations((5.917540604, 0)):
            Circle(SKETCH9_R)
    extrude(amount=-CUT_EXTRUDE6_DEPTH, mode=Mode.SUBTRACT)

    # Sketch12 → Cut-Extrude7 (cut)
    with BuildSketch(Plane.XY.offset(68)):
        Polygon((-11.75, 4.540707856), (-15.082459396, 5.433637661), (-15.082459396, -5.433637661), (-11.75, -4.540707856), align=None)
    extrude(amount=-CUT_EXTRUDE7_DEPTH, mode=Mode.SUBTRACT)

    # Sketch14 → Cut-Extrude8 (cut)
    with BuildSketch(Plane(origin=(14.082459396, 0, 0), x_dir=(0, 0, -1), z_dir=(1, 0, 0))):
        with Locations((-61, 8)):
            Circle(SKETCH14_R)
        with Locations((-61, -8)):
            Circle(SKETCH14_R)
    extrude(amount=-CUT_EXTRUDE8_DEPTH, mode=Mode.SUBTRACT)

    # Fillet2
    # the kernel refuses this fillet: 2 mm, written as the material it takes off along each edge
    with BuildSketch(Plane(origin=(-15.082459396, -12.99, -8), x_dir=(0, 1, 0), z_dir=(0, 0, 1)), Plane(origin=(-15.082459396, 12.99, -8), x_dir=(1, 0, 0), z_dir=(0, 0, 1))) as fillet2_piece_1:
        with BuildLine():
            CenterArc((FILLET2_R, -FILLET2_R), FILLET2_R, 90, 90)
            Line((0, -FILLET2_R), (0, 0))
            Line((0, 0), (FILLET2_R, 0))
        make_face()
    extrude(amount=81, mode=Mode.SUBTRACT)
    with BuildSketch(Plane(origin=(-15.082459396, 5.433637661, 71.83663494), x_dir=(0.965925826289068, -0.2588190451025217, 0), z_dir=(0, 0, -1)), Plane(origin=(-15.082459396, -5.433637661, 71.83663494), x_dir=(0, -1, 0), z_dir=(0, 0, -1))) as fillet2_piece_2:
        with BuildLine():
            CenterArc((FILLET2_R * 0.767326987979, -FILLET2_R), FILLET2_R, 90, 75)
            Line((-FILLET2_R * 0.19859883831, -FILLET2_R * 0.741180954897), (0, 0))
            Line((0, 0), (FILLET2_R * 0.767326987979, 0))
        make_face()
    extrude(amount=67.83663494, mode=Mode.SUBTRACT)


solid = part.part
